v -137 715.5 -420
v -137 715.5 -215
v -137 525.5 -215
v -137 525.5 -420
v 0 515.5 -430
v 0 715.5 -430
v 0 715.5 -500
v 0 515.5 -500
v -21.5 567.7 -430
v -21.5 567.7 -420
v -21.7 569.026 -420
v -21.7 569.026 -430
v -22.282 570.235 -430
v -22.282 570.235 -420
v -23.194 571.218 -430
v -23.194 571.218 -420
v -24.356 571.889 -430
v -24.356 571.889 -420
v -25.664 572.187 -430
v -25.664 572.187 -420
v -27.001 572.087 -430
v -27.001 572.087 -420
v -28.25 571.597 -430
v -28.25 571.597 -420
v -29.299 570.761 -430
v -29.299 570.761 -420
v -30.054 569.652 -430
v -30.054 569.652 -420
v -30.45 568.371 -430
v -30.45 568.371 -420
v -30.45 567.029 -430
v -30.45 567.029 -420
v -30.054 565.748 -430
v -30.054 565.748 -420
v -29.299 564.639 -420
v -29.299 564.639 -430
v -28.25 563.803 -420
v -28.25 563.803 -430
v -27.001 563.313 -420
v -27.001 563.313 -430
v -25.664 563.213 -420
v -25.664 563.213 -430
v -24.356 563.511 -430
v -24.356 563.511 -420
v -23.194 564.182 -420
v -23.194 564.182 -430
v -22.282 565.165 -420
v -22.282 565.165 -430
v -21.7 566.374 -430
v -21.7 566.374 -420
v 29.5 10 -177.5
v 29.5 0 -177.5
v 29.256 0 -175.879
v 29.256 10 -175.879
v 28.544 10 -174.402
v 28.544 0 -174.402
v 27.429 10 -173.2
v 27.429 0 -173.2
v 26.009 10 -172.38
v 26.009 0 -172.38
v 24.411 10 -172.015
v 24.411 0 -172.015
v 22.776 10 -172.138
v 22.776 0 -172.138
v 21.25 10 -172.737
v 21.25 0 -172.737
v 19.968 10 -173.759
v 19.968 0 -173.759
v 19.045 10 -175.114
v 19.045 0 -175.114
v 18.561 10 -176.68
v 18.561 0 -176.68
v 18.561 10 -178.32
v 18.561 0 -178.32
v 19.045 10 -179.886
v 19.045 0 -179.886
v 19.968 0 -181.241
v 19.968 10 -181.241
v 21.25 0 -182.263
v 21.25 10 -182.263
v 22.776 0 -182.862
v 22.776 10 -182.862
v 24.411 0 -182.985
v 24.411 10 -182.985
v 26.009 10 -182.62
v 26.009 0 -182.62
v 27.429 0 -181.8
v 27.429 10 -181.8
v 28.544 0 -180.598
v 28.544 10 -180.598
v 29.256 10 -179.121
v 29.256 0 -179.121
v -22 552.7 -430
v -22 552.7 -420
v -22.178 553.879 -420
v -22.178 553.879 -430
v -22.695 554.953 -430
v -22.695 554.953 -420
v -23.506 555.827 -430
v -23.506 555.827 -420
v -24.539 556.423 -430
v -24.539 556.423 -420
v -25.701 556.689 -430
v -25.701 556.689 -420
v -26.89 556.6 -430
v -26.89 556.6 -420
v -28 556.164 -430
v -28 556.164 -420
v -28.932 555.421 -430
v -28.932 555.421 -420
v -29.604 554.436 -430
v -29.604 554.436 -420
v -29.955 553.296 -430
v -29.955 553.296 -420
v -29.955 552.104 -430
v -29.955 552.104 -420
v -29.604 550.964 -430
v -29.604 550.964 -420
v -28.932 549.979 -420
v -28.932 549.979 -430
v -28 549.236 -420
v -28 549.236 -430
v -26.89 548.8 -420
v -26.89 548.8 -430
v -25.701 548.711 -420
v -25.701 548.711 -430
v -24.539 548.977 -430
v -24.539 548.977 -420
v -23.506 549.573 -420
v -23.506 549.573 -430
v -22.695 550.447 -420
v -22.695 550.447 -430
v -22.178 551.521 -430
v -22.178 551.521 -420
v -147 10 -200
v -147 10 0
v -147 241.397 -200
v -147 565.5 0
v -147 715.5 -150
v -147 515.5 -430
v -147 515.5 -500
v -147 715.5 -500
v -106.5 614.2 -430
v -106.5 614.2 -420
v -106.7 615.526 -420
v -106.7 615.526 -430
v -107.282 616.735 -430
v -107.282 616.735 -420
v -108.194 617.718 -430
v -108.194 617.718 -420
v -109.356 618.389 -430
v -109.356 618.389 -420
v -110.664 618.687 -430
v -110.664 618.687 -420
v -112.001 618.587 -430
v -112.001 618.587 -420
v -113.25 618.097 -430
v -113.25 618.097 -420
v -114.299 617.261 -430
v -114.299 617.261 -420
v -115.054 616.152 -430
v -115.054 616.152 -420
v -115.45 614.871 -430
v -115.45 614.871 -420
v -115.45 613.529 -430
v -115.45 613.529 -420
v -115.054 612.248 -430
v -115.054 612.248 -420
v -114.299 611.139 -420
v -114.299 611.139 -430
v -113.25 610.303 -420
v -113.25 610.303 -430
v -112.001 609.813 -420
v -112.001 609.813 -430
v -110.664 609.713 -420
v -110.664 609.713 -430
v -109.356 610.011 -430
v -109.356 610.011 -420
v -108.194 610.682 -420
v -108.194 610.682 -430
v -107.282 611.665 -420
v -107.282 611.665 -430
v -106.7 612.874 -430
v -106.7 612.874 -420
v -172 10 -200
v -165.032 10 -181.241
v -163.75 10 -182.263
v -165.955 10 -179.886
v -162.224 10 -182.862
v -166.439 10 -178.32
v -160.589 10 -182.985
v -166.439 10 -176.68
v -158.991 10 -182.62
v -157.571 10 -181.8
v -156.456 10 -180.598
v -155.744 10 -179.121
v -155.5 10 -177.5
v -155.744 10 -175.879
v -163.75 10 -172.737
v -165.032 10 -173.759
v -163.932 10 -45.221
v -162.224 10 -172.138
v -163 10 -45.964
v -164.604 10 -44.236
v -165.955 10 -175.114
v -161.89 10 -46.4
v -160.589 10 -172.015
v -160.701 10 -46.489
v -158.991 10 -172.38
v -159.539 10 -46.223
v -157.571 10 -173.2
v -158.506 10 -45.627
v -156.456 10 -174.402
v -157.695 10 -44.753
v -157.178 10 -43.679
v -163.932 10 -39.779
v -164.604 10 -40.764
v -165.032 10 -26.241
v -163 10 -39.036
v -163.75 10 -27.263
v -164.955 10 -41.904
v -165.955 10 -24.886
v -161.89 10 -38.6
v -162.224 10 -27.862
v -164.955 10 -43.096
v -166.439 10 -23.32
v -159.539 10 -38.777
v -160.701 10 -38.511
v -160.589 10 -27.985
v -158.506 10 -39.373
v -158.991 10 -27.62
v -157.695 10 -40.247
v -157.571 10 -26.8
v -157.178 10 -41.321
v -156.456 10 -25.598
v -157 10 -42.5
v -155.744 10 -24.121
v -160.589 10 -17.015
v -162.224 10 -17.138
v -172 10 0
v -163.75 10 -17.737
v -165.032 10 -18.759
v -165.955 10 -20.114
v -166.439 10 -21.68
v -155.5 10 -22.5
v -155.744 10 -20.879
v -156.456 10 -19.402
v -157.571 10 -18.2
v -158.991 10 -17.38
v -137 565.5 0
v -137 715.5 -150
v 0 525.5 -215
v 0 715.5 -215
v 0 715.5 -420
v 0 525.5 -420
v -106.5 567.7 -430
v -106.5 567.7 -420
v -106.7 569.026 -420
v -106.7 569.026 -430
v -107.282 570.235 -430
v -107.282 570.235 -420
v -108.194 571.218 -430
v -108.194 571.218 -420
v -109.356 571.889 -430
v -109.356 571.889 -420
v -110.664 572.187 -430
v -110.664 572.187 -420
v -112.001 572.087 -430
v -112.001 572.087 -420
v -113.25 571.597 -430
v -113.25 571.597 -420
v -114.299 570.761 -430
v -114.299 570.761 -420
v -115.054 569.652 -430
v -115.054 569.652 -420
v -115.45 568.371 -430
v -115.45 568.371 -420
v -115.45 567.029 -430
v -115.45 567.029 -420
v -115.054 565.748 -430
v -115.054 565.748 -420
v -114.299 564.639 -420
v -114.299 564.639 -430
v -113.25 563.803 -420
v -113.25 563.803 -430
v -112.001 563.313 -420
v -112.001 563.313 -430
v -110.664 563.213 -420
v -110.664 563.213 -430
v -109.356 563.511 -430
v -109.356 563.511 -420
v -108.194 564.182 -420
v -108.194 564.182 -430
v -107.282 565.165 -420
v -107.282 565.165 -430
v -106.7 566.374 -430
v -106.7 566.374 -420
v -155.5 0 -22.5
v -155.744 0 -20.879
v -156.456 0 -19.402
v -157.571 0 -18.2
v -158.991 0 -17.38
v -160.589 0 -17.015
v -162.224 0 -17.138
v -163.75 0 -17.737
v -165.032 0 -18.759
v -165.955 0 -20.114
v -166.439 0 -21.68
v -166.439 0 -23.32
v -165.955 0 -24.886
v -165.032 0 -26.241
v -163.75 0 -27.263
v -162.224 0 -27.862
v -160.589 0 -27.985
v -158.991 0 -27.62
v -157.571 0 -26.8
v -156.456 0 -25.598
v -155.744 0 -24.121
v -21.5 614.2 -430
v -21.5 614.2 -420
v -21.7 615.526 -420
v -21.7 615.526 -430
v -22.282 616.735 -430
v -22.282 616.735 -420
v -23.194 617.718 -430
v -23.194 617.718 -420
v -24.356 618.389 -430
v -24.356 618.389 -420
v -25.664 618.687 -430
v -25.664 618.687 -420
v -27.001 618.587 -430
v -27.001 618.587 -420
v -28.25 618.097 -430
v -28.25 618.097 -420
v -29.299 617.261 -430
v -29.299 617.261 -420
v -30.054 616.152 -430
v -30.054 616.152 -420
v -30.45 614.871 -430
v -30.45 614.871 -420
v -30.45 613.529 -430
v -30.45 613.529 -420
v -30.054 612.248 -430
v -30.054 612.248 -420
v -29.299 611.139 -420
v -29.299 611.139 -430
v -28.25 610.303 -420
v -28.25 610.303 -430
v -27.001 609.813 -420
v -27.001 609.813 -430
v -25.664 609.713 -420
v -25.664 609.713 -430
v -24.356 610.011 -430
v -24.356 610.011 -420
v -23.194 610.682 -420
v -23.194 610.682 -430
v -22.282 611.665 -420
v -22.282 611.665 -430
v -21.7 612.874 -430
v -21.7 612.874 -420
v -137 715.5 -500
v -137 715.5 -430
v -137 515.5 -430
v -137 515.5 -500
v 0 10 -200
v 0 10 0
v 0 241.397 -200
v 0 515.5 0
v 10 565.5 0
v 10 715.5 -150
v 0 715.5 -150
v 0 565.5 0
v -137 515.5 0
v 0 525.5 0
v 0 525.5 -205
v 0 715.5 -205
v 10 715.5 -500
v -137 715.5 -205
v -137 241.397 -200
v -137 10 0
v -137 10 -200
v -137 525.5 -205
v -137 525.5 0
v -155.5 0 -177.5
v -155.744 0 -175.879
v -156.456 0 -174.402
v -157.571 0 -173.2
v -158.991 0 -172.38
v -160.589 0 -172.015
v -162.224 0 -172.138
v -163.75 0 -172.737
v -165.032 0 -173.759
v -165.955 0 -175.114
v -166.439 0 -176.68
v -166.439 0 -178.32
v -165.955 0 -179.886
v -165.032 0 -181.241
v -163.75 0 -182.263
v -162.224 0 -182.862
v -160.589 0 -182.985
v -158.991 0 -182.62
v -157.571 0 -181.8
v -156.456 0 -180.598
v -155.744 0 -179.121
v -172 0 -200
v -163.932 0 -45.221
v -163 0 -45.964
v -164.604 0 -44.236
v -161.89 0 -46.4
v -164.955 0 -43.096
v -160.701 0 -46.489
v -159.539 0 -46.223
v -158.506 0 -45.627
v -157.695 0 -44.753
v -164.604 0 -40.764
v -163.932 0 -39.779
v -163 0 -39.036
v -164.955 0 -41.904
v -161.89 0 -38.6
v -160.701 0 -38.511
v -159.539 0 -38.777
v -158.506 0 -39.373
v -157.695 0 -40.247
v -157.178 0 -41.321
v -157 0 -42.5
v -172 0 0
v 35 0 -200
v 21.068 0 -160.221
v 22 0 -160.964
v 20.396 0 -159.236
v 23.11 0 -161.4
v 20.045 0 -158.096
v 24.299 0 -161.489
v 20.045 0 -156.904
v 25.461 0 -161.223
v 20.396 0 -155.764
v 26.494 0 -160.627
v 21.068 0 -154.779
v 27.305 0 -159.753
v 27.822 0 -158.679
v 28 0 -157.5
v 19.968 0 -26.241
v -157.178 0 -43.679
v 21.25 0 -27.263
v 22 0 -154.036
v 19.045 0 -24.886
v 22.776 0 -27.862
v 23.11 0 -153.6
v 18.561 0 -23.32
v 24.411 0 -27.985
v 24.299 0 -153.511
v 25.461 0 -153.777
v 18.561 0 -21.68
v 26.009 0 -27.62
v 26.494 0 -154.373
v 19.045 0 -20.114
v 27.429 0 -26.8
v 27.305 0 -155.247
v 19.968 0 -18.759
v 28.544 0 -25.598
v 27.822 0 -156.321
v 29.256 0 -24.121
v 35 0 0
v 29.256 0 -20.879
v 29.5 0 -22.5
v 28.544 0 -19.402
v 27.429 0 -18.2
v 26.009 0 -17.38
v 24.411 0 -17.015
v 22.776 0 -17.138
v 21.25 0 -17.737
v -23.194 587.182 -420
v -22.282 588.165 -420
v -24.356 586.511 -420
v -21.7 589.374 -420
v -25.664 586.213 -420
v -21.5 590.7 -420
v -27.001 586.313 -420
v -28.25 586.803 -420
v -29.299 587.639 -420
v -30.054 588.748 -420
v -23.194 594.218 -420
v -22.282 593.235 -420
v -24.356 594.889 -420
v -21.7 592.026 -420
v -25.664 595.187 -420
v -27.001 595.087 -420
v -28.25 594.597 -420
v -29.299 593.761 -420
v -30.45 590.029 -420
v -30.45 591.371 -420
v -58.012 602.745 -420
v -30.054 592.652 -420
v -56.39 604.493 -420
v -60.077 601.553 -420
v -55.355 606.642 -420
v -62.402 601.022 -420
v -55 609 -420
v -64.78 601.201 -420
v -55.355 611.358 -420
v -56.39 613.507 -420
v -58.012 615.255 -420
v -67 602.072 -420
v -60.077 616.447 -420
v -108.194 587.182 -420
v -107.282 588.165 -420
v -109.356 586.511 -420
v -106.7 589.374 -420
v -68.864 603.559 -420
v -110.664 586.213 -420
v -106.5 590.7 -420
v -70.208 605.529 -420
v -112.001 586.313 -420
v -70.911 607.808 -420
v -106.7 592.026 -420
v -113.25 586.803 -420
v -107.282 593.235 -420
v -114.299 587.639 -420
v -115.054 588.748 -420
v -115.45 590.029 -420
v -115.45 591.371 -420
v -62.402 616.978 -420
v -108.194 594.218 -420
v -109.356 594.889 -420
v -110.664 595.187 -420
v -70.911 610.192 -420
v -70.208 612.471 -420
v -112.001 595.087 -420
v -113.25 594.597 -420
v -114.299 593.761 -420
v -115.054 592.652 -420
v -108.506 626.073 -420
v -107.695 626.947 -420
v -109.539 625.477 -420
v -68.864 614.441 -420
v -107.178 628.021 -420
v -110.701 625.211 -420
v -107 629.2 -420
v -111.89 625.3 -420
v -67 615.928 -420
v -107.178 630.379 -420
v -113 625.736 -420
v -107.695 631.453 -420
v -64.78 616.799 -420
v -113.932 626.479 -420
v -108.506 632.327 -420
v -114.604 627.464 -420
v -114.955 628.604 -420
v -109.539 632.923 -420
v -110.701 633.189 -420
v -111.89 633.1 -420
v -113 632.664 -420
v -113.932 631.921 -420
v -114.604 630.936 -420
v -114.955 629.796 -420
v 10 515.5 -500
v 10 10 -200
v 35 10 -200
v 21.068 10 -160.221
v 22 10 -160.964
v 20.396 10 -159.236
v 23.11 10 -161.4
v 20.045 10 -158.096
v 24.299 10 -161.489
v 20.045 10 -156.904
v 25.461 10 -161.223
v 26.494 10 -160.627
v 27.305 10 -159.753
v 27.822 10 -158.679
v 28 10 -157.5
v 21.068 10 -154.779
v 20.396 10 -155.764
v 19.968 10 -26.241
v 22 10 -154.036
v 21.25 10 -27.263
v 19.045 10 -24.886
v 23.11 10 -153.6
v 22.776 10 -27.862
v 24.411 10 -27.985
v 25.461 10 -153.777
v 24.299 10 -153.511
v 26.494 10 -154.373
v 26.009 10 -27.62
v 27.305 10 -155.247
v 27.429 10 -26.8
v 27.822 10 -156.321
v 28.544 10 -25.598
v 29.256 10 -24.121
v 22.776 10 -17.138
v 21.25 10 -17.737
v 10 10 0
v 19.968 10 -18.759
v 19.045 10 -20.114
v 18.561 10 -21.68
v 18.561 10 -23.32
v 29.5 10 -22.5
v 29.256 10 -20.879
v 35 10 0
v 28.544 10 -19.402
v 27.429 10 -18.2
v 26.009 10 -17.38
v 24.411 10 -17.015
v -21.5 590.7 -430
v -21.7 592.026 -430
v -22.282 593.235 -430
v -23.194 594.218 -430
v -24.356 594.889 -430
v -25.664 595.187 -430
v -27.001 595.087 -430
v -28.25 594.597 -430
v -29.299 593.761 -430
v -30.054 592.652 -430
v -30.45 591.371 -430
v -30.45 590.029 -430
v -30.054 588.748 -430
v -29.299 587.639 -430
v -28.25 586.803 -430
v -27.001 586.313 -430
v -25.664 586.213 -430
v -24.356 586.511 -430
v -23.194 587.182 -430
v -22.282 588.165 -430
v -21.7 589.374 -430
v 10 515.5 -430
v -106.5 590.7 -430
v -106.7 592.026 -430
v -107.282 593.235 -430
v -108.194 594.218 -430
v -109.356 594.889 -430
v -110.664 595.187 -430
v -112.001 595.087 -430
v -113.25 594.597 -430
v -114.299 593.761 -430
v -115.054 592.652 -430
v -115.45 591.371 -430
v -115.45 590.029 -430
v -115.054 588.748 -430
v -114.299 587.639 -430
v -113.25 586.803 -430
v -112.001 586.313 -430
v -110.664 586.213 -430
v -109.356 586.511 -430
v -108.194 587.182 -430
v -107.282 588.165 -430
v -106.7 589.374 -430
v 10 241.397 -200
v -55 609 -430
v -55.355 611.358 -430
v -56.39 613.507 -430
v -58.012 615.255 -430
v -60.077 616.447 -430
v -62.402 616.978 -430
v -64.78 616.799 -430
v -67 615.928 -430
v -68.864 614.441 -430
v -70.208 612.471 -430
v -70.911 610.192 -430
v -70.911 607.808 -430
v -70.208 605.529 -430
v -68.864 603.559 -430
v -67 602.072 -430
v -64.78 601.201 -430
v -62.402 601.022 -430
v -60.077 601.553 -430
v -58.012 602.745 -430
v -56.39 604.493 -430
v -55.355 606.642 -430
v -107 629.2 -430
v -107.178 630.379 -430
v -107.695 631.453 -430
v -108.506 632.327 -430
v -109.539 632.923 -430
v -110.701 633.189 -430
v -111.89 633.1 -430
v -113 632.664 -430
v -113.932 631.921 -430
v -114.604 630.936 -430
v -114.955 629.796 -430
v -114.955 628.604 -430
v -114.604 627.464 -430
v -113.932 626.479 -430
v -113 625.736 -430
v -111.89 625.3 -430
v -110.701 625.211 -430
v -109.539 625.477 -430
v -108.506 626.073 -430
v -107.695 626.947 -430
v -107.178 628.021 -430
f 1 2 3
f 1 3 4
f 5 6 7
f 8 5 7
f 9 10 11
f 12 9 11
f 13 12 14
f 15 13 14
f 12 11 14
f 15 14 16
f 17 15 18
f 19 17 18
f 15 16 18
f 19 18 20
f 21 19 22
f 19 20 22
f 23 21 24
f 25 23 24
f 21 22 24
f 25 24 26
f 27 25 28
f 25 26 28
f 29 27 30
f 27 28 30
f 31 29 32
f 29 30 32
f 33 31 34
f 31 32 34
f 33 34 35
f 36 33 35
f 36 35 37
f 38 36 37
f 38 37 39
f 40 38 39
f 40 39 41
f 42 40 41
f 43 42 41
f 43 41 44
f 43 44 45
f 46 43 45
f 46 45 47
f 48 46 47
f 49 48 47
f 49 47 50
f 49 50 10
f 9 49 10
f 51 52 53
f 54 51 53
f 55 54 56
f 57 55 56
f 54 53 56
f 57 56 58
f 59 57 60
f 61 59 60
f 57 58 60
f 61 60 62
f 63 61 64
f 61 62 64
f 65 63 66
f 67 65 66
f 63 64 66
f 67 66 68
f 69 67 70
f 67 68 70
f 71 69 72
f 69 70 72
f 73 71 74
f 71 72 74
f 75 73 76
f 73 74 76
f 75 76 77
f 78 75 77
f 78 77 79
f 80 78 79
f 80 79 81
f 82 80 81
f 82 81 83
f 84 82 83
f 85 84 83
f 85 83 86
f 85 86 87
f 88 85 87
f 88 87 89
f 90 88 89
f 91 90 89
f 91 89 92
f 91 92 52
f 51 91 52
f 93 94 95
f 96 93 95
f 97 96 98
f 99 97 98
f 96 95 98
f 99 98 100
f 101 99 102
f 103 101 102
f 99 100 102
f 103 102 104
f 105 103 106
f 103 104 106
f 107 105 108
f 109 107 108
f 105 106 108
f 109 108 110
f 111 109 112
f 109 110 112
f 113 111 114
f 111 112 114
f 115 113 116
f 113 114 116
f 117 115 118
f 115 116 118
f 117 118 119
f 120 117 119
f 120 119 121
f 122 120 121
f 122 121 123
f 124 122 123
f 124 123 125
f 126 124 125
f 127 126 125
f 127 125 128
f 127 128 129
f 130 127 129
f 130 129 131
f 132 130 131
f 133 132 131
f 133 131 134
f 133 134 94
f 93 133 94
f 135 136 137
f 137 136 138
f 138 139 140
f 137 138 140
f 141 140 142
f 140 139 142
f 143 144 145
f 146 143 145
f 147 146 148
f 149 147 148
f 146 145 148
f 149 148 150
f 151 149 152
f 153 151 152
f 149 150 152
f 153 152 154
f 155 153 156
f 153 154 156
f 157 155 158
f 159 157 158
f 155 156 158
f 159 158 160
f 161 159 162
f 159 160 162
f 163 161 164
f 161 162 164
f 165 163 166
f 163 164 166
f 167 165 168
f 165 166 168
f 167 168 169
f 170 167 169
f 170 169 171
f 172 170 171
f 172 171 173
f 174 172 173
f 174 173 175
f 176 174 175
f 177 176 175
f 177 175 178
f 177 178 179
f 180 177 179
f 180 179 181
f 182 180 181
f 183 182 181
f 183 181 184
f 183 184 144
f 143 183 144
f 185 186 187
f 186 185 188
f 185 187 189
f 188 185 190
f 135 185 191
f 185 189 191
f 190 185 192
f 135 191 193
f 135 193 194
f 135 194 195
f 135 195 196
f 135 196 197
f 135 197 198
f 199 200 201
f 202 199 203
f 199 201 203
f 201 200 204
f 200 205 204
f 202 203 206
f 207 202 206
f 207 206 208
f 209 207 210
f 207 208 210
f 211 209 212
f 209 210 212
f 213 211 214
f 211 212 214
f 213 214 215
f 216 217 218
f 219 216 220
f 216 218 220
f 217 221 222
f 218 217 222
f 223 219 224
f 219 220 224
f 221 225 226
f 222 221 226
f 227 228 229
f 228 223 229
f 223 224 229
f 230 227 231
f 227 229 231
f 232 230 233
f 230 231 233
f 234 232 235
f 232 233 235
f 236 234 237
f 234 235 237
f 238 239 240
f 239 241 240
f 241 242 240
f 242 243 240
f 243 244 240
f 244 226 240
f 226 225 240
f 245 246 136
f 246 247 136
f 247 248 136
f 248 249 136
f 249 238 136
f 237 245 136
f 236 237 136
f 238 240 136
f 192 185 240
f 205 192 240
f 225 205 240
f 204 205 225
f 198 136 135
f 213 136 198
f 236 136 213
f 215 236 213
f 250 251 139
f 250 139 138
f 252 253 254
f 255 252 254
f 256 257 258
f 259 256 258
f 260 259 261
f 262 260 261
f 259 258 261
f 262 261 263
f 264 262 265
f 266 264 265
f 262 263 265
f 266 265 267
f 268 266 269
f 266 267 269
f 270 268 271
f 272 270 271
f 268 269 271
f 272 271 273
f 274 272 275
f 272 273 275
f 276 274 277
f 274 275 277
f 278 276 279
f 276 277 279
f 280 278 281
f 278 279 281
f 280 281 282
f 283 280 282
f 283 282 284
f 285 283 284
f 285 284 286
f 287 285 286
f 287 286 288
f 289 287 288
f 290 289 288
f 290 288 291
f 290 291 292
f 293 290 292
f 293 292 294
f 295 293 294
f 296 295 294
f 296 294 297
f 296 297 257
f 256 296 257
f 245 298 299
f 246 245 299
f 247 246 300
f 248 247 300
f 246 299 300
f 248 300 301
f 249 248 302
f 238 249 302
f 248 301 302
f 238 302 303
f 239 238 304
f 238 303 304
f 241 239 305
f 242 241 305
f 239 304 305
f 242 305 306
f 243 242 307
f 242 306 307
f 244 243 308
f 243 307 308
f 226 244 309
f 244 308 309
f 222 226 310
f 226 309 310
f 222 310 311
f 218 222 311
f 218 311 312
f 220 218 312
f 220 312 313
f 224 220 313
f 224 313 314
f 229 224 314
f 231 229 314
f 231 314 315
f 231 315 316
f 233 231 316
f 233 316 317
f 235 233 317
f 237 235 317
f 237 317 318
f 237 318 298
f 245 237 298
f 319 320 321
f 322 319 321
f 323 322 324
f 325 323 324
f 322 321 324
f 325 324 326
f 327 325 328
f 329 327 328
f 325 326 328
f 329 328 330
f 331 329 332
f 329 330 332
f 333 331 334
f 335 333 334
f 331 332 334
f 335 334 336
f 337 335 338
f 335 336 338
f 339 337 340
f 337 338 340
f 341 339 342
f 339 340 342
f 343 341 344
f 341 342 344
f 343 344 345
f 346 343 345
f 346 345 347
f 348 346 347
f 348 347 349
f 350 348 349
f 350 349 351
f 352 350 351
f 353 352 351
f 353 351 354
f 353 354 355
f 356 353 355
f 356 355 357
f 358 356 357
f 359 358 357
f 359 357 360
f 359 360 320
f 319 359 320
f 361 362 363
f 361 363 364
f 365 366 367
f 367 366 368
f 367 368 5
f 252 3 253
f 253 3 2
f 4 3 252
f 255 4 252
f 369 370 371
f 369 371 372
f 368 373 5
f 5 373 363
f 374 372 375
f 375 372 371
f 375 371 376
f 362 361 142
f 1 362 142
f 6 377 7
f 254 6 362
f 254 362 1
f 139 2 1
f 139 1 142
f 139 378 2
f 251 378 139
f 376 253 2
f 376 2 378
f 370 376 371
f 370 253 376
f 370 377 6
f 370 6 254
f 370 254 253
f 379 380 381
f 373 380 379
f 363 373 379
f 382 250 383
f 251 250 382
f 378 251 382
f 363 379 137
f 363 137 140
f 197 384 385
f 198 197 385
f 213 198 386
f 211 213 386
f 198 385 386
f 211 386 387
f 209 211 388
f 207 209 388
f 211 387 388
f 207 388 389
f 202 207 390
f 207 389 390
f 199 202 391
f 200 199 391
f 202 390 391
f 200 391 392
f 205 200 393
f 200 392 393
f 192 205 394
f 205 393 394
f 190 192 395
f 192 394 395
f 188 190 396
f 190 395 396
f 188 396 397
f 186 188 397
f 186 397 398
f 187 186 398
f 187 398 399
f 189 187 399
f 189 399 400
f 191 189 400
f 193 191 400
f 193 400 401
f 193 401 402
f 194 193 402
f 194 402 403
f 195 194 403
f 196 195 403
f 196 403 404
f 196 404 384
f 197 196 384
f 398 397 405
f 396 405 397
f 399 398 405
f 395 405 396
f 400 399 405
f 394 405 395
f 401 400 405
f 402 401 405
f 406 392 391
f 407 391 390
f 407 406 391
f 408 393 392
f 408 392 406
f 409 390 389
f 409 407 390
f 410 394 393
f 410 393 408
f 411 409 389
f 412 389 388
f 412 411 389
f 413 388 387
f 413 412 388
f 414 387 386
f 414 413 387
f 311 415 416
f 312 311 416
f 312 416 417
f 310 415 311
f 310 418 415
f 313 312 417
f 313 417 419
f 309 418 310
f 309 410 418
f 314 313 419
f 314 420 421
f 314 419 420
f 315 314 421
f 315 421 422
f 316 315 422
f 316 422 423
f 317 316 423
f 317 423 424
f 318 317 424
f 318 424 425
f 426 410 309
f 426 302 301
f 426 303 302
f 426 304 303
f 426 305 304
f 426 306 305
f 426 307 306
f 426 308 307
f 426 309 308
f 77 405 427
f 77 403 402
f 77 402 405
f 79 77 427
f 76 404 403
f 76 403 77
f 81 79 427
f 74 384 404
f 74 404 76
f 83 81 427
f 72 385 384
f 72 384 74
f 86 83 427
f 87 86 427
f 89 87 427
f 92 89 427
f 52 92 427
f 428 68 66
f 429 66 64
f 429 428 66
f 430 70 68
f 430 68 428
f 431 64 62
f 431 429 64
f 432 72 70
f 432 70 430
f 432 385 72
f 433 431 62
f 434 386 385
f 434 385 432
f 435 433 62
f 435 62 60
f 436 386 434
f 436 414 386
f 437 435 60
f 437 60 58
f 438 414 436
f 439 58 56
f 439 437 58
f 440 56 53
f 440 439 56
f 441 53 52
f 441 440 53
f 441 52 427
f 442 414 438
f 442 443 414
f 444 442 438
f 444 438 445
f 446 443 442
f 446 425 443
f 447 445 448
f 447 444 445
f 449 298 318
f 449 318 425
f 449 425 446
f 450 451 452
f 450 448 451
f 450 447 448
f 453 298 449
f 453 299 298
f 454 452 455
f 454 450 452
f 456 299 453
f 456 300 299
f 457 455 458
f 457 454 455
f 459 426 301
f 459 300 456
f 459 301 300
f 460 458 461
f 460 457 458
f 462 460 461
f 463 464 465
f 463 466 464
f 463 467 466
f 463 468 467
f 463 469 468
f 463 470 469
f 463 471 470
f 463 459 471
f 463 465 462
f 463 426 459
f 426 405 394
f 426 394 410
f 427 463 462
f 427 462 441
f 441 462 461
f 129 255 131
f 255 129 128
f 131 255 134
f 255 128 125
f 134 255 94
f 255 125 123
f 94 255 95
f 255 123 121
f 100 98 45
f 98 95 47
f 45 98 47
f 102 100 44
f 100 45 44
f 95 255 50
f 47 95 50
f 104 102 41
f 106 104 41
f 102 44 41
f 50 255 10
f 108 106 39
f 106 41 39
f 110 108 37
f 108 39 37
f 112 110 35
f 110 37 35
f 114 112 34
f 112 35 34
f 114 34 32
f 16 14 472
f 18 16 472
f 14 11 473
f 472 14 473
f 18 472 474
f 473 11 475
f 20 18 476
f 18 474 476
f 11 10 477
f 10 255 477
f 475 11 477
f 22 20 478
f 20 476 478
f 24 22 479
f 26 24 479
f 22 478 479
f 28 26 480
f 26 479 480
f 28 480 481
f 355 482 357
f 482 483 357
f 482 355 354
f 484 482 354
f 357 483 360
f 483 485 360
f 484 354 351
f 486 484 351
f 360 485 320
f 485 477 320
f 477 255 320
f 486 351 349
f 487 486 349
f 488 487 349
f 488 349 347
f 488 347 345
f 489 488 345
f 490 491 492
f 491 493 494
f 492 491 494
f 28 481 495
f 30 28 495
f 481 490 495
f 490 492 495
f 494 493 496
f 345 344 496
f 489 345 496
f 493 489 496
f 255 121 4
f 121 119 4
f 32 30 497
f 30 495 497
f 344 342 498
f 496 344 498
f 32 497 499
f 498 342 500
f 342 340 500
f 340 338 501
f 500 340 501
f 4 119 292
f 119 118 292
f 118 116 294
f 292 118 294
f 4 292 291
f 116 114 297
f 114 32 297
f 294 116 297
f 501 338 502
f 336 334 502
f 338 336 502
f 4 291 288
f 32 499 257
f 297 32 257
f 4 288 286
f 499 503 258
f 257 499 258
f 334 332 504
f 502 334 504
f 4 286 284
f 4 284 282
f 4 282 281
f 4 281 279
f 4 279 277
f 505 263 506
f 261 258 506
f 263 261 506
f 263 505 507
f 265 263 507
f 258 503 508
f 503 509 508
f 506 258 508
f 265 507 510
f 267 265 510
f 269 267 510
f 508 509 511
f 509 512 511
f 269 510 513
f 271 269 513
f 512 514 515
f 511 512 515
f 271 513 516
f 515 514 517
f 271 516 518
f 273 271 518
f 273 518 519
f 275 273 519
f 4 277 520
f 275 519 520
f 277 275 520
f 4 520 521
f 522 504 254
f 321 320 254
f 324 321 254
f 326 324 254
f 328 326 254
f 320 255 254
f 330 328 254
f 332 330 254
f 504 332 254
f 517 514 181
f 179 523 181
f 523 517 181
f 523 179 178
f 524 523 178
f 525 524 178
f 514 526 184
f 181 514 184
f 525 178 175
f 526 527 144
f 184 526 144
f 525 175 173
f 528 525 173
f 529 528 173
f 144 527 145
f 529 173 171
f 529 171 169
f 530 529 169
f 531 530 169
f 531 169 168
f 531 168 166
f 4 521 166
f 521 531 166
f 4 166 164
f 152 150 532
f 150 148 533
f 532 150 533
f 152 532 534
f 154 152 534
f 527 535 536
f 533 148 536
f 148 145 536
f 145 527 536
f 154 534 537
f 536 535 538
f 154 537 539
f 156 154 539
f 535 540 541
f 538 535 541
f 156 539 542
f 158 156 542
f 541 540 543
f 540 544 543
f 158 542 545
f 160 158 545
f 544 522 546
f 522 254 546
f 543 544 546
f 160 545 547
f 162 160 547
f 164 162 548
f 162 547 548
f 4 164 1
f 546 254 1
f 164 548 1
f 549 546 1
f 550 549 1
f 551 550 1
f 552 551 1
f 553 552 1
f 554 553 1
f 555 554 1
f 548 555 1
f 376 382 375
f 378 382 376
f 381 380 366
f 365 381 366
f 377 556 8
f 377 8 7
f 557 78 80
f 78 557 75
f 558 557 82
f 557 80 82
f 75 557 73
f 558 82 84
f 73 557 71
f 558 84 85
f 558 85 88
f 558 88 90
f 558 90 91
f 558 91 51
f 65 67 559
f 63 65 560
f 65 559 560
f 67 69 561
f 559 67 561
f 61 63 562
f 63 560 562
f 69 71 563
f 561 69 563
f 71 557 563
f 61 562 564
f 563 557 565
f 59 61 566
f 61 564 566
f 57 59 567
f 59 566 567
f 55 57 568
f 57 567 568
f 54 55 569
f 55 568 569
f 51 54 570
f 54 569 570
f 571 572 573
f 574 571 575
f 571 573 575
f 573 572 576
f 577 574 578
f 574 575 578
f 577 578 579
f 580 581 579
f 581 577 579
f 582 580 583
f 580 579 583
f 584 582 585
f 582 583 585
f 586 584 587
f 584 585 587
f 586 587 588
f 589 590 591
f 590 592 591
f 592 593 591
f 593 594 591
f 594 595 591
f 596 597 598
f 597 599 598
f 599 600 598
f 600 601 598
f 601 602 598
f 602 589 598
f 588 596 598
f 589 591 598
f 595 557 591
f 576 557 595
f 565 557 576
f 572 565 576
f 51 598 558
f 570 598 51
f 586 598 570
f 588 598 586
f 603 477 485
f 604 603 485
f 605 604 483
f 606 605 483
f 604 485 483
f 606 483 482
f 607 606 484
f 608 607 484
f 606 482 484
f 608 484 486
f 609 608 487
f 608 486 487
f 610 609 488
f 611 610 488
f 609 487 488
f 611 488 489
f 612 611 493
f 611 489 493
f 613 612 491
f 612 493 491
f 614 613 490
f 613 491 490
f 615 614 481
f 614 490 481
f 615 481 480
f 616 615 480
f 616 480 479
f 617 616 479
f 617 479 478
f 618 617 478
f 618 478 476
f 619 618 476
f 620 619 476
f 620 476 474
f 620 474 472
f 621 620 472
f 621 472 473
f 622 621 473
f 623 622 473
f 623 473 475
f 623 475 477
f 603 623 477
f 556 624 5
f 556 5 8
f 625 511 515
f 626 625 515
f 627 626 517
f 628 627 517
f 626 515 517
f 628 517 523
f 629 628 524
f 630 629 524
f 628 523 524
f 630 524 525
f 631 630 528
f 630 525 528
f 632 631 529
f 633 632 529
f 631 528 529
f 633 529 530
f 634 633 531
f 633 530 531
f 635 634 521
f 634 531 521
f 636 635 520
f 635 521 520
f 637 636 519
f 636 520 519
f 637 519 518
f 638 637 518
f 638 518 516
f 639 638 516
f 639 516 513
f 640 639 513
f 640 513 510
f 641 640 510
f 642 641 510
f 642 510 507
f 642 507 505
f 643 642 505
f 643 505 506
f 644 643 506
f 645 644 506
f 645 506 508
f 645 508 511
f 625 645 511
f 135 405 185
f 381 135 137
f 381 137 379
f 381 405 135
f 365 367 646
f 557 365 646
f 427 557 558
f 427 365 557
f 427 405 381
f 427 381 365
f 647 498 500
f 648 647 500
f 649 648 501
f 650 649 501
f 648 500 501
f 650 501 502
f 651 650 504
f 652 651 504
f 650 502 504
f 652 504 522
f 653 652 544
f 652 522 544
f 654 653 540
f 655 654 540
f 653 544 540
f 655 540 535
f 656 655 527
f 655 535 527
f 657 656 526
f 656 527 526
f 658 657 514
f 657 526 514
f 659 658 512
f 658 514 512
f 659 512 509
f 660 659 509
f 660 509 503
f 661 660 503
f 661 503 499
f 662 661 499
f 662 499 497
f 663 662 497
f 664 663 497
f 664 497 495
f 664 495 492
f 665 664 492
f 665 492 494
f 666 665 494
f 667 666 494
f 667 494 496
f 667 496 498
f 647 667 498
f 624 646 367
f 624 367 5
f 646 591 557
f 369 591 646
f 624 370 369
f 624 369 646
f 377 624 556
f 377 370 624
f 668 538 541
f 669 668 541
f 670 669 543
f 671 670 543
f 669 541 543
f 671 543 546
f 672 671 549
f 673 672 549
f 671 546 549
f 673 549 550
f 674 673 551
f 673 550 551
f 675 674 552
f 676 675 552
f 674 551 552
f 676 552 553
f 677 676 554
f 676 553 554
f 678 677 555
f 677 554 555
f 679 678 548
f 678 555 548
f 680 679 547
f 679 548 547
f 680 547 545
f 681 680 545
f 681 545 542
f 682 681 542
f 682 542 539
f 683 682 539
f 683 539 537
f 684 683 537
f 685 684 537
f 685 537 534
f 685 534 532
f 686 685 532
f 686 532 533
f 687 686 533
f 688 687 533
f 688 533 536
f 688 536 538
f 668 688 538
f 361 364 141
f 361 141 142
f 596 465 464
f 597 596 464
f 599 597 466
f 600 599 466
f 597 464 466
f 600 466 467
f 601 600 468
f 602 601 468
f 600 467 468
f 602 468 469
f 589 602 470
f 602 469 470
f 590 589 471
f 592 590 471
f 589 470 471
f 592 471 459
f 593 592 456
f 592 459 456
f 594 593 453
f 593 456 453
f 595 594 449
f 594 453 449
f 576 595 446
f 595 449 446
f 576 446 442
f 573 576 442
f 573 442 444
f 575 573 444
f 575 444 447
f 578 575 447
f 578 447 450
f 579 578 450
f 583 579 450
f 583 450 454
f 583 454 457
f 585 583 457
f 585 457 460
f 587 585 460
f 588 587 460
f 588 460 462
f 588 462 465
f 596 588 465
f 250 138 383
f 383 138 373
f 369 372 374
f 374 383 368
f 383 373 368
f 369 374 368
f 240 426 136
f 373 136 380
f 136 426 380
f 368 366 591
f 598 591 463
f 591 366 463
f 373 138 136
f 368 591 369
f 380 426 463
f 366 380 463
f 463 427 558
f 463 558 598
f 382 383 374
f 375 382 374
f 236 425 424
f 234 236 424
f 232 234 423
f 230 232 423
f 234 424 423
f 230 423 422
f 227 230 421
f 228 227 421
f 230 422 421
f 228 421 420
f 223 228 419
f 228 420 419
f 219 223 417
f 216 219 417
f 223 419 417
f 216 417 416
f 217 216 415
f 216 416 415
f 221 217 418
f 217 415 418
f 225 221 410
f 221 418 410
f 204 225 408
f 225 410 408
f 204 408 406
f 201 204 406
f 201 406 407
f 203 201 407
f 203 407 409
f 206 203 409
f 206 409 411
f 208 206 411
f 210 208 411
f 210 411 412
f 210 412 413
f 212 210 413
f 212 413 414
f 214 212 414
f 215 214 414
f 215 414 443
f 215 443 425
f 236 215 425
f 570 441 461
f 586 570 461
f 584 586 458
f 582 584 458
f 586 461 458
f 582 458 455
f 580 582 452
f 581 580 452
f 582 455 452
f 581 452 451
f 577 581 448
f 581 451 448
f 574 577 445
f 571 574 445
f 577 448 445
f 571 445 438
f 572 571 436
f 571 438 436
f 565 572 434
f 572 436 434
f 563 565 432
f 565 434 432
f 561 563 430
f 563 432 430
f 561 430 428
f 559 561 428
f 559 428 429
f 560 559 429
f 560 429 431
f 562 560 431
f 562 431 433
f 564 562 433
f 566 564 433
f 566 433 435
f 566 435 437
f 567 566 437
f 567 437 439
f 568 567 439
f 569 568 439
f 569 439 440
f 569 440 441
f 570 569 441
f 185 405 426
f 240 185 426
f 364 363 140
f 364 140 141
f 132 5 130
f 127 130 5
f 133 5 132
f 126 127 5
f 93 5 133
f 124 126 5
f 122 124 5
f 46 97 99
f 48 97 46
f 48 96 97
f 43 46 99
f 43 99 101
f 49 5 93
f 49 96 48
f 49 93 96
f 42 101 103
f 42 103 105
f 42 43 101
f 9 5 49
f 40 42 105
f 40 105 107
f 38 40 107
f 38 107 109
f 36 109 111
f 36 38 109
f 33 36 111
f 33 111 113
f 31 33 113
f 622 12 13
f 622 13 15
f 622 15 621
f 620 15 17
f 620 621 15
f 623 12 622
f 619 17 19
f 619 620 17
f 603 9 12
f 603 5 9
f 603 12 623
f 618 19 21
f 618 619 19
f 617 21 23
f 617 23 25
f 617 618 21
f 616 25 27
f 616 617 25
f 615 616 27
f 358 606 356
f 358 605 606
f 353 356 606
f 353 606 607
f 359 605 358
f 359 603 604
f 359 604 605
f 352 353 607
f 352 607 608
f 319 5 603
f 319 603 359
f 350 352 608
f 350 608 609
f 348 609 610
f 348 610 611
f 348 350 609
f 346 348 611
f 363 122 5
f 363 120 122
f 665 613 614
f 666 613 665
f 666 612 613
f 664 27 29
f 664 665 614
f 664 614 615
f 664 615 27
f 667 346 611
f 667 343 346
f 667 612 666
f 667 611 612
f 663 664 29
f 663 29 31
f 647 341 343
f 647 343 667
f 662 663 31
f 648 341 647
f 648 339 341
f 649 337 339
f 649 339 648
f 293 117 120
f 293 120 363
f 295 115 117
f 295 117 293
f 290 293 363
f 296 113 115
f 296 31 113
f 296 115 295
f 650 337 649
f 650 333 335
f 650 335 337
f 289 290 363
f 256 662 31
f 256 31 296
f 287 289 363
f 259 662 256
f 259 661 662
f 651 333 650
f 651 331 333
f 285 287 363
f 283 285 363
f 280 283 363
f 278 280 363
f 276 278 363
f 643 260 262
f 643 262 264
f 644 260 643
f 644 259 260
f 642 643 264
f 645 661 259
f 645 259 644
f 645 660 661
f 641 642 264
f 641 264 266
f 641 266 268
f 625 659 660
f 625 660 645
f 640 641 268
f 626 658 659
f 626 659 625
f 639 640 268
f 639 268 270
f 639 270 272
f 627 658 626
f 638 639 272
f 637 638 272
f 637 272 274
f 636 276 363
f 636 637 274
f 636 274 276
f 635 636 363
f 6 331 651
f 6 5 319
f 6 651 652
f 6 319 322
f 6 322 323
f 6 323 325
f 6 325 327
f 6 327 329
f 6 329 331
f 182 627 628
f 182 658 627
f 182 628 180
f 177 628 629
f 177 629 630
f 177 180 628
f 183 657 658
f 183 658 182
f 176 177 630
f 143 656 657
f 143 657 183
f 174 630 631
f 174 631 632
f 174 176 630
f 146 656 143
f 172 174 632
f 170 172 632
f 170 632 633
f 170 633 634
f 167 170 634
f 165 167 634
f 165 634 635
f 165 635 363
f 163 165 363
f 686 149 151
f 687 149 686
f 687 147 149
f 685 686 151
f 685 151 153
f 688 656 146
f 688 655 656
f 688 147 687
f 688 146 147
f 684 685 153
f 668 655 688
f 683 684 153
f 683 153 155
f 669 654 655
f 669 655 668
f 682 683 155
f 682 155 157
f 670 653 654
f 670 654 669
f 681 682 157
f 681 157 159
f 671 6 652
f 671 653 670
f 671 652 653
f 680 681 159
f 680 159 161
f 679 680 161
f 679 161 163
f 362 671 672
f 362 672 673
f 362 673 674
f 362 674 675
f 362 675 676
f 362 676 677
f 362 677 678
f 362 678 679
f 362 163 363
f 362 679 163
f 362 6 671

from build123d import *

# Parameters (mm, degrees)
BOSS_EXTRUDE1_DEPTH      = 10
BOSS_EXTRUDE1_DEPTH_BACK = 147
SKETCH3_W                = 137
SKETCH3_H                = 500
CUT_EXTRUDE1_DEPTH       = 705.5
SKETCH4_W                = 137
SKETCH4_H                = 200
BOSS_EXTRUDE2_DEPTH      = 10
CUT_EXTRUDE3_REACH       = 82
SKETCH6_R                = 4.5
SKETCH6_R_2              = 8
SKETCH6_R_3              = 4
SKETCH9_W                = 25
SKETCH9_H                = 200
BOSS_EXTRUDE4_DEPTH      = 10
SKETCH10_R               = 5.5
SKETCH10_R_2             = 4
CUT_EXTRUDE4_DEPTH       = 716.5
SKETCH11_W               = 137
SKETCH11_H               = 430
BOSS_EXTRUDE5_DEPTH      = 10
SKETCH12_W               = 10
SKETCH12_H               = 200
BOSS_EXTRUDE6_DEPTH      = 137


with BuildPart() as part:
    # Sketch1 → Boss-Extrude1 (new body, two sides)
    with BuildSketch(Plane(origin=(0, 0, 0), x_dir=(0, 0, -1), z_dir=(1, 0, 0))) as boss_extrude1_sk:
        Polygon((200, 515.5), (200, 241.396673703), (430, 515.5), align=None)
        Polygon((200, 0), (200, 515.5), (500, 515.5), (500, 715.5), (150, 715.5), (0, 565.5), (0, 0), align=None)
    extrude(amount=BOSS_EXTRUDE1_DEPTH)
    extrude(boss_extrude1_sk.sketch, amount=-BOSS_EXTRUDE1_DEPTH_BACK)

    # Sketch3 → Cut-Extrude1 (cut)
    with BuildSketch(Plane(origin=(0, 715.5, 0), x_dir=(1, 0, 0), z_dir=(0, 1, 0))):
        with Locations((-68.5, 250)):
            Rectangle(SKETCH3_W, SKETCH3_H)
    extrude(amount=-CUT_EXTRUDE1_DEPTH, mode=Mode.SUBTRACT)

    # Sketch4 → Boss-Extrude2 (add)
    with BuildSketch(Plane(origin=(0, 0, -430), x_dir=(-1, 0, 0), z_dir=(0, 0, -1))):
        with Locations((68.5, 615.5)):
            Rectangle(SKETCH4_W, SKETCH4_H)
    extrude(amount=-BOSS_EXTRUDE2_DEPTH)

    # Sketch6 → Cut-Extrude3 (cut, up to next)
    with BuildSketch(Plane.XY.offset(-420), mode=Mode.PRIVATE) as cut_extrude3_sk1:
        with Locations((-111, 567.7)):
            Circle(SKETCH6_R)
    cut_extrude3_tool1 = extrude(cut_extrude3_sk1.sketch, amount=-CUT_EXTRUDE3_REACH, mode=Mode.PRIVATE) & part.part
    add(cut_extrude3_tool1.solids().sort_by_distance((-111, 567.7, -420))[0], mode=Mode.SUBTRACT)
    # Sketch6 → Cut-Extrude3 (cut, up to next)
    with BuildSketch(Plane.XY.offset(-420), mode=Mode.PRIVATE) as cut_extrude3_sk2:
        with Locations((-26, 567.7)):
            Circle(SKETCH6_R)
    cut_extrude3_tool2 = extrude(cut_extrude3_sk2.sketch, amount=-CUT_EXTRUDE3_REACH, mode=Mode.PRIVATE) & part.part
    add(cut_extrude3_tool2.solids().sort_by_distance((-26, 567.7, -420))[0], mode=Mode.SUBTRACT)
    # Sketch6 → Cut-Extrude3 (cut, up to next)
    with BuildSketch(Plane.XY.offset(-420), mode=Mode.PRIVATE) as cut_extrude3_sk3:
        with Locations((-111, 614.2)):
            Circle(SKETCH6_R)
    cut_extrude3_tool3 = extrude(cut_extrude3_sk3.sketch, amount=-CUT_EXTRUDE3_REACH, mode=Mode.PRIVATE) & part.part
    add(cut_extrude3_tool3.solids().sort_by_distance((-111, 614.2, -420))[0], mode=Mode.SUBTRACT)
    # Sketch6 → Cut-Extrude3 (cut, up to next)
    with BuildSketch(Plane.XY.offset(-420), mode=Mode.PRIVATE) as cut_extrude3_sk4:
        with Locations((-26, 614.2)):
            Circle(SKETCH6_R)
    cut_extrude3_tool4 = extrude(cut_extrude3_sk4.sketch, amount=-CUT_EXTRUDE3_REACH, mode=Mode.PRIVATE) & part.part
    add(cut_extrude3_tool4.solids().sort_by_distance((-26, 614.2, -420))[0], mode=Mode.SUBTRACT)
    # Sketch6 → Cut-Extrude3 (cut, up to next)
    with BuildSketch(Plane.XY.offset(-420), mode=Mode.PRIVATE) as cut_extrude3_sk5:
        with Locations((-63, 609)):
            Circle(SKETCH6_R_2)
    cut_extrude3_tool5 = extrude(cut_extrude3_sk5.sketch, amount=-CUT_EXTRUDE3_REACH, mode=Mode.PRIVATE) & part.part
    add(cut_extrude3_tool5.solids().sort_by_distance((-63, 609, -420))[0], mode=Mode.SUBTRACT)
    # Sketch6 → Cut-Extrude3 (cut, up to next)
    with BuildSketch(Plane.XY.offset(-420), mode=Mode.PRIVATE) as cut_extrude3_sk6:
        with Locations((-111, 629.2)):
            Circle(SKETCH6_R_3)
    cut_extrude3_tool6 = extrude(cut_extrude3_sk6.sketch, amount=-CUT_EXTRUDE3_REACH, mode=Mode.PRIVATE) & part.part
    add(cut_extrude3_tool6.solids().sort_by_distance((-111, 629.2, -420))[0], mode=Mode.SUBTRACT)
    # Sketch6 → Cut-Extrude3 (cut, up to next)
    with BuildSketch(Plane.XY.offset(-420), mode=Mode.PRIVATE) as cut_extrude3_sk7:
        with Locations((-26, 552.7)):
            Circle(SKETCH6_R_3)
    cut_extrude3_tool7 = extrude(cut_extrude3_sk7.sketch, amount=-CUT_EXTRUDE3_REACH, mode=Mode.PRIVATE) & part.part
    add(cut_extrude3_tool7.solids().sort_by_distance((-26, 552.7, -420))[0], mode=Mode.SUBTRACT)
    # Sketch6 → Cut-Extrude3 (cut, up to next)
    with BuildSketch(Plane.XY.offset(-420), mode=Mode.PRIVATE) as cut_extrude3_sk8:
        with Locations((-111, 590.7)):
            Circle(SKETCH6_R)
    cut_extrude3_tool8 = extrude(cut_extrude3_sk8.sketch, amount=-CUT_EXTRUDE3_REACH, mode=Mode.PRIVATE) & part.part
    add(cut_extrude3_tool8.solids().sort_by_distance((-111, 590.7, -420))[0], mode=Mode.SUBTRACT)
    # Sketch6 → Cut-Extrude3 (cut, up to next)
    with BuildSketch(Plane.XY.offset(-420), mode=Mode.PRIVATE) as cut_extrude3_sk9:
        with Locations((-26, 590.7)):
            Circle(SKETCH6_R)
    cut_extrude3_tool9 = extrude(cut_extrude3_sk9.sketch, amount=-CUT_EXTRUDE3_REACH, mode=Mode.PRIVATE) & part.part
    add(cut_extrude3_tool9.solids().sort_by_distance((-26, 590.7, -420))[0], mode=Mode.SUBTRACT)

    # Sketch9 → Boss-Extrude4 (add)
    with BuildSketch(Plane.XZ):
        with Locations((-159.5, -100)):
            Rectangle(SKETCH9_W, SKETCH9_H)
        with Locations((22.5, -100)):
            Rectangle(SKETCH9_W, SKETCH9_H)
    extrude(amount=-BOSS_EXTRUDE4_DEPTH)

    # Sketch10 → Cut-Extrude4 (cut, through all)
    with BuildSketch(Plane.XZ):
        with Locations((-161, -22.5)):
            Circle(SKETCH10_R)
        with Locations((24, -22.5)):
            Circle(SKETCH10_R)
        with Locations((24, -177.5)):
            Circle(SKETCH10_R)
        with Locations((-161, -177.5)):
            Circle(SKETCH10_R)
        with Locations((-161, -42.5)):
            Circle(SKETCH10_R_2)
        with Locations((24, -157.5)):
            Circle(SKETCH10_R_2)
    extrude(amount=-CUT_EXTRUDE4_DEPTH, mode=Mode.SUBTRACT)

    # Sketch11 → Boss-Extrude5 (add)
    with BuildSketch(Plane.XZ.offset(-515.5)):
        with Locations((-68.5, -215)):
            Rectangle(SKETCH11_W, SKETCH11_H)
    extrude(amount=-BOSS_EXTRUDE5_DEPTH)

    # Sketch12 → Boss-Extrude6 (add)
    with BuildSketch(Plane(origin=(-137, 0, 0), x_dir=(0, 0, -1), z_dir=(1, 0, 0))):
        with Locations((210, 615.5)):
            Rectangle(SKETCH12_W, SKETCH12_H)
    extrude(amount=BOSS_EXTRUDE6_DEPTH)


solid = part.part
